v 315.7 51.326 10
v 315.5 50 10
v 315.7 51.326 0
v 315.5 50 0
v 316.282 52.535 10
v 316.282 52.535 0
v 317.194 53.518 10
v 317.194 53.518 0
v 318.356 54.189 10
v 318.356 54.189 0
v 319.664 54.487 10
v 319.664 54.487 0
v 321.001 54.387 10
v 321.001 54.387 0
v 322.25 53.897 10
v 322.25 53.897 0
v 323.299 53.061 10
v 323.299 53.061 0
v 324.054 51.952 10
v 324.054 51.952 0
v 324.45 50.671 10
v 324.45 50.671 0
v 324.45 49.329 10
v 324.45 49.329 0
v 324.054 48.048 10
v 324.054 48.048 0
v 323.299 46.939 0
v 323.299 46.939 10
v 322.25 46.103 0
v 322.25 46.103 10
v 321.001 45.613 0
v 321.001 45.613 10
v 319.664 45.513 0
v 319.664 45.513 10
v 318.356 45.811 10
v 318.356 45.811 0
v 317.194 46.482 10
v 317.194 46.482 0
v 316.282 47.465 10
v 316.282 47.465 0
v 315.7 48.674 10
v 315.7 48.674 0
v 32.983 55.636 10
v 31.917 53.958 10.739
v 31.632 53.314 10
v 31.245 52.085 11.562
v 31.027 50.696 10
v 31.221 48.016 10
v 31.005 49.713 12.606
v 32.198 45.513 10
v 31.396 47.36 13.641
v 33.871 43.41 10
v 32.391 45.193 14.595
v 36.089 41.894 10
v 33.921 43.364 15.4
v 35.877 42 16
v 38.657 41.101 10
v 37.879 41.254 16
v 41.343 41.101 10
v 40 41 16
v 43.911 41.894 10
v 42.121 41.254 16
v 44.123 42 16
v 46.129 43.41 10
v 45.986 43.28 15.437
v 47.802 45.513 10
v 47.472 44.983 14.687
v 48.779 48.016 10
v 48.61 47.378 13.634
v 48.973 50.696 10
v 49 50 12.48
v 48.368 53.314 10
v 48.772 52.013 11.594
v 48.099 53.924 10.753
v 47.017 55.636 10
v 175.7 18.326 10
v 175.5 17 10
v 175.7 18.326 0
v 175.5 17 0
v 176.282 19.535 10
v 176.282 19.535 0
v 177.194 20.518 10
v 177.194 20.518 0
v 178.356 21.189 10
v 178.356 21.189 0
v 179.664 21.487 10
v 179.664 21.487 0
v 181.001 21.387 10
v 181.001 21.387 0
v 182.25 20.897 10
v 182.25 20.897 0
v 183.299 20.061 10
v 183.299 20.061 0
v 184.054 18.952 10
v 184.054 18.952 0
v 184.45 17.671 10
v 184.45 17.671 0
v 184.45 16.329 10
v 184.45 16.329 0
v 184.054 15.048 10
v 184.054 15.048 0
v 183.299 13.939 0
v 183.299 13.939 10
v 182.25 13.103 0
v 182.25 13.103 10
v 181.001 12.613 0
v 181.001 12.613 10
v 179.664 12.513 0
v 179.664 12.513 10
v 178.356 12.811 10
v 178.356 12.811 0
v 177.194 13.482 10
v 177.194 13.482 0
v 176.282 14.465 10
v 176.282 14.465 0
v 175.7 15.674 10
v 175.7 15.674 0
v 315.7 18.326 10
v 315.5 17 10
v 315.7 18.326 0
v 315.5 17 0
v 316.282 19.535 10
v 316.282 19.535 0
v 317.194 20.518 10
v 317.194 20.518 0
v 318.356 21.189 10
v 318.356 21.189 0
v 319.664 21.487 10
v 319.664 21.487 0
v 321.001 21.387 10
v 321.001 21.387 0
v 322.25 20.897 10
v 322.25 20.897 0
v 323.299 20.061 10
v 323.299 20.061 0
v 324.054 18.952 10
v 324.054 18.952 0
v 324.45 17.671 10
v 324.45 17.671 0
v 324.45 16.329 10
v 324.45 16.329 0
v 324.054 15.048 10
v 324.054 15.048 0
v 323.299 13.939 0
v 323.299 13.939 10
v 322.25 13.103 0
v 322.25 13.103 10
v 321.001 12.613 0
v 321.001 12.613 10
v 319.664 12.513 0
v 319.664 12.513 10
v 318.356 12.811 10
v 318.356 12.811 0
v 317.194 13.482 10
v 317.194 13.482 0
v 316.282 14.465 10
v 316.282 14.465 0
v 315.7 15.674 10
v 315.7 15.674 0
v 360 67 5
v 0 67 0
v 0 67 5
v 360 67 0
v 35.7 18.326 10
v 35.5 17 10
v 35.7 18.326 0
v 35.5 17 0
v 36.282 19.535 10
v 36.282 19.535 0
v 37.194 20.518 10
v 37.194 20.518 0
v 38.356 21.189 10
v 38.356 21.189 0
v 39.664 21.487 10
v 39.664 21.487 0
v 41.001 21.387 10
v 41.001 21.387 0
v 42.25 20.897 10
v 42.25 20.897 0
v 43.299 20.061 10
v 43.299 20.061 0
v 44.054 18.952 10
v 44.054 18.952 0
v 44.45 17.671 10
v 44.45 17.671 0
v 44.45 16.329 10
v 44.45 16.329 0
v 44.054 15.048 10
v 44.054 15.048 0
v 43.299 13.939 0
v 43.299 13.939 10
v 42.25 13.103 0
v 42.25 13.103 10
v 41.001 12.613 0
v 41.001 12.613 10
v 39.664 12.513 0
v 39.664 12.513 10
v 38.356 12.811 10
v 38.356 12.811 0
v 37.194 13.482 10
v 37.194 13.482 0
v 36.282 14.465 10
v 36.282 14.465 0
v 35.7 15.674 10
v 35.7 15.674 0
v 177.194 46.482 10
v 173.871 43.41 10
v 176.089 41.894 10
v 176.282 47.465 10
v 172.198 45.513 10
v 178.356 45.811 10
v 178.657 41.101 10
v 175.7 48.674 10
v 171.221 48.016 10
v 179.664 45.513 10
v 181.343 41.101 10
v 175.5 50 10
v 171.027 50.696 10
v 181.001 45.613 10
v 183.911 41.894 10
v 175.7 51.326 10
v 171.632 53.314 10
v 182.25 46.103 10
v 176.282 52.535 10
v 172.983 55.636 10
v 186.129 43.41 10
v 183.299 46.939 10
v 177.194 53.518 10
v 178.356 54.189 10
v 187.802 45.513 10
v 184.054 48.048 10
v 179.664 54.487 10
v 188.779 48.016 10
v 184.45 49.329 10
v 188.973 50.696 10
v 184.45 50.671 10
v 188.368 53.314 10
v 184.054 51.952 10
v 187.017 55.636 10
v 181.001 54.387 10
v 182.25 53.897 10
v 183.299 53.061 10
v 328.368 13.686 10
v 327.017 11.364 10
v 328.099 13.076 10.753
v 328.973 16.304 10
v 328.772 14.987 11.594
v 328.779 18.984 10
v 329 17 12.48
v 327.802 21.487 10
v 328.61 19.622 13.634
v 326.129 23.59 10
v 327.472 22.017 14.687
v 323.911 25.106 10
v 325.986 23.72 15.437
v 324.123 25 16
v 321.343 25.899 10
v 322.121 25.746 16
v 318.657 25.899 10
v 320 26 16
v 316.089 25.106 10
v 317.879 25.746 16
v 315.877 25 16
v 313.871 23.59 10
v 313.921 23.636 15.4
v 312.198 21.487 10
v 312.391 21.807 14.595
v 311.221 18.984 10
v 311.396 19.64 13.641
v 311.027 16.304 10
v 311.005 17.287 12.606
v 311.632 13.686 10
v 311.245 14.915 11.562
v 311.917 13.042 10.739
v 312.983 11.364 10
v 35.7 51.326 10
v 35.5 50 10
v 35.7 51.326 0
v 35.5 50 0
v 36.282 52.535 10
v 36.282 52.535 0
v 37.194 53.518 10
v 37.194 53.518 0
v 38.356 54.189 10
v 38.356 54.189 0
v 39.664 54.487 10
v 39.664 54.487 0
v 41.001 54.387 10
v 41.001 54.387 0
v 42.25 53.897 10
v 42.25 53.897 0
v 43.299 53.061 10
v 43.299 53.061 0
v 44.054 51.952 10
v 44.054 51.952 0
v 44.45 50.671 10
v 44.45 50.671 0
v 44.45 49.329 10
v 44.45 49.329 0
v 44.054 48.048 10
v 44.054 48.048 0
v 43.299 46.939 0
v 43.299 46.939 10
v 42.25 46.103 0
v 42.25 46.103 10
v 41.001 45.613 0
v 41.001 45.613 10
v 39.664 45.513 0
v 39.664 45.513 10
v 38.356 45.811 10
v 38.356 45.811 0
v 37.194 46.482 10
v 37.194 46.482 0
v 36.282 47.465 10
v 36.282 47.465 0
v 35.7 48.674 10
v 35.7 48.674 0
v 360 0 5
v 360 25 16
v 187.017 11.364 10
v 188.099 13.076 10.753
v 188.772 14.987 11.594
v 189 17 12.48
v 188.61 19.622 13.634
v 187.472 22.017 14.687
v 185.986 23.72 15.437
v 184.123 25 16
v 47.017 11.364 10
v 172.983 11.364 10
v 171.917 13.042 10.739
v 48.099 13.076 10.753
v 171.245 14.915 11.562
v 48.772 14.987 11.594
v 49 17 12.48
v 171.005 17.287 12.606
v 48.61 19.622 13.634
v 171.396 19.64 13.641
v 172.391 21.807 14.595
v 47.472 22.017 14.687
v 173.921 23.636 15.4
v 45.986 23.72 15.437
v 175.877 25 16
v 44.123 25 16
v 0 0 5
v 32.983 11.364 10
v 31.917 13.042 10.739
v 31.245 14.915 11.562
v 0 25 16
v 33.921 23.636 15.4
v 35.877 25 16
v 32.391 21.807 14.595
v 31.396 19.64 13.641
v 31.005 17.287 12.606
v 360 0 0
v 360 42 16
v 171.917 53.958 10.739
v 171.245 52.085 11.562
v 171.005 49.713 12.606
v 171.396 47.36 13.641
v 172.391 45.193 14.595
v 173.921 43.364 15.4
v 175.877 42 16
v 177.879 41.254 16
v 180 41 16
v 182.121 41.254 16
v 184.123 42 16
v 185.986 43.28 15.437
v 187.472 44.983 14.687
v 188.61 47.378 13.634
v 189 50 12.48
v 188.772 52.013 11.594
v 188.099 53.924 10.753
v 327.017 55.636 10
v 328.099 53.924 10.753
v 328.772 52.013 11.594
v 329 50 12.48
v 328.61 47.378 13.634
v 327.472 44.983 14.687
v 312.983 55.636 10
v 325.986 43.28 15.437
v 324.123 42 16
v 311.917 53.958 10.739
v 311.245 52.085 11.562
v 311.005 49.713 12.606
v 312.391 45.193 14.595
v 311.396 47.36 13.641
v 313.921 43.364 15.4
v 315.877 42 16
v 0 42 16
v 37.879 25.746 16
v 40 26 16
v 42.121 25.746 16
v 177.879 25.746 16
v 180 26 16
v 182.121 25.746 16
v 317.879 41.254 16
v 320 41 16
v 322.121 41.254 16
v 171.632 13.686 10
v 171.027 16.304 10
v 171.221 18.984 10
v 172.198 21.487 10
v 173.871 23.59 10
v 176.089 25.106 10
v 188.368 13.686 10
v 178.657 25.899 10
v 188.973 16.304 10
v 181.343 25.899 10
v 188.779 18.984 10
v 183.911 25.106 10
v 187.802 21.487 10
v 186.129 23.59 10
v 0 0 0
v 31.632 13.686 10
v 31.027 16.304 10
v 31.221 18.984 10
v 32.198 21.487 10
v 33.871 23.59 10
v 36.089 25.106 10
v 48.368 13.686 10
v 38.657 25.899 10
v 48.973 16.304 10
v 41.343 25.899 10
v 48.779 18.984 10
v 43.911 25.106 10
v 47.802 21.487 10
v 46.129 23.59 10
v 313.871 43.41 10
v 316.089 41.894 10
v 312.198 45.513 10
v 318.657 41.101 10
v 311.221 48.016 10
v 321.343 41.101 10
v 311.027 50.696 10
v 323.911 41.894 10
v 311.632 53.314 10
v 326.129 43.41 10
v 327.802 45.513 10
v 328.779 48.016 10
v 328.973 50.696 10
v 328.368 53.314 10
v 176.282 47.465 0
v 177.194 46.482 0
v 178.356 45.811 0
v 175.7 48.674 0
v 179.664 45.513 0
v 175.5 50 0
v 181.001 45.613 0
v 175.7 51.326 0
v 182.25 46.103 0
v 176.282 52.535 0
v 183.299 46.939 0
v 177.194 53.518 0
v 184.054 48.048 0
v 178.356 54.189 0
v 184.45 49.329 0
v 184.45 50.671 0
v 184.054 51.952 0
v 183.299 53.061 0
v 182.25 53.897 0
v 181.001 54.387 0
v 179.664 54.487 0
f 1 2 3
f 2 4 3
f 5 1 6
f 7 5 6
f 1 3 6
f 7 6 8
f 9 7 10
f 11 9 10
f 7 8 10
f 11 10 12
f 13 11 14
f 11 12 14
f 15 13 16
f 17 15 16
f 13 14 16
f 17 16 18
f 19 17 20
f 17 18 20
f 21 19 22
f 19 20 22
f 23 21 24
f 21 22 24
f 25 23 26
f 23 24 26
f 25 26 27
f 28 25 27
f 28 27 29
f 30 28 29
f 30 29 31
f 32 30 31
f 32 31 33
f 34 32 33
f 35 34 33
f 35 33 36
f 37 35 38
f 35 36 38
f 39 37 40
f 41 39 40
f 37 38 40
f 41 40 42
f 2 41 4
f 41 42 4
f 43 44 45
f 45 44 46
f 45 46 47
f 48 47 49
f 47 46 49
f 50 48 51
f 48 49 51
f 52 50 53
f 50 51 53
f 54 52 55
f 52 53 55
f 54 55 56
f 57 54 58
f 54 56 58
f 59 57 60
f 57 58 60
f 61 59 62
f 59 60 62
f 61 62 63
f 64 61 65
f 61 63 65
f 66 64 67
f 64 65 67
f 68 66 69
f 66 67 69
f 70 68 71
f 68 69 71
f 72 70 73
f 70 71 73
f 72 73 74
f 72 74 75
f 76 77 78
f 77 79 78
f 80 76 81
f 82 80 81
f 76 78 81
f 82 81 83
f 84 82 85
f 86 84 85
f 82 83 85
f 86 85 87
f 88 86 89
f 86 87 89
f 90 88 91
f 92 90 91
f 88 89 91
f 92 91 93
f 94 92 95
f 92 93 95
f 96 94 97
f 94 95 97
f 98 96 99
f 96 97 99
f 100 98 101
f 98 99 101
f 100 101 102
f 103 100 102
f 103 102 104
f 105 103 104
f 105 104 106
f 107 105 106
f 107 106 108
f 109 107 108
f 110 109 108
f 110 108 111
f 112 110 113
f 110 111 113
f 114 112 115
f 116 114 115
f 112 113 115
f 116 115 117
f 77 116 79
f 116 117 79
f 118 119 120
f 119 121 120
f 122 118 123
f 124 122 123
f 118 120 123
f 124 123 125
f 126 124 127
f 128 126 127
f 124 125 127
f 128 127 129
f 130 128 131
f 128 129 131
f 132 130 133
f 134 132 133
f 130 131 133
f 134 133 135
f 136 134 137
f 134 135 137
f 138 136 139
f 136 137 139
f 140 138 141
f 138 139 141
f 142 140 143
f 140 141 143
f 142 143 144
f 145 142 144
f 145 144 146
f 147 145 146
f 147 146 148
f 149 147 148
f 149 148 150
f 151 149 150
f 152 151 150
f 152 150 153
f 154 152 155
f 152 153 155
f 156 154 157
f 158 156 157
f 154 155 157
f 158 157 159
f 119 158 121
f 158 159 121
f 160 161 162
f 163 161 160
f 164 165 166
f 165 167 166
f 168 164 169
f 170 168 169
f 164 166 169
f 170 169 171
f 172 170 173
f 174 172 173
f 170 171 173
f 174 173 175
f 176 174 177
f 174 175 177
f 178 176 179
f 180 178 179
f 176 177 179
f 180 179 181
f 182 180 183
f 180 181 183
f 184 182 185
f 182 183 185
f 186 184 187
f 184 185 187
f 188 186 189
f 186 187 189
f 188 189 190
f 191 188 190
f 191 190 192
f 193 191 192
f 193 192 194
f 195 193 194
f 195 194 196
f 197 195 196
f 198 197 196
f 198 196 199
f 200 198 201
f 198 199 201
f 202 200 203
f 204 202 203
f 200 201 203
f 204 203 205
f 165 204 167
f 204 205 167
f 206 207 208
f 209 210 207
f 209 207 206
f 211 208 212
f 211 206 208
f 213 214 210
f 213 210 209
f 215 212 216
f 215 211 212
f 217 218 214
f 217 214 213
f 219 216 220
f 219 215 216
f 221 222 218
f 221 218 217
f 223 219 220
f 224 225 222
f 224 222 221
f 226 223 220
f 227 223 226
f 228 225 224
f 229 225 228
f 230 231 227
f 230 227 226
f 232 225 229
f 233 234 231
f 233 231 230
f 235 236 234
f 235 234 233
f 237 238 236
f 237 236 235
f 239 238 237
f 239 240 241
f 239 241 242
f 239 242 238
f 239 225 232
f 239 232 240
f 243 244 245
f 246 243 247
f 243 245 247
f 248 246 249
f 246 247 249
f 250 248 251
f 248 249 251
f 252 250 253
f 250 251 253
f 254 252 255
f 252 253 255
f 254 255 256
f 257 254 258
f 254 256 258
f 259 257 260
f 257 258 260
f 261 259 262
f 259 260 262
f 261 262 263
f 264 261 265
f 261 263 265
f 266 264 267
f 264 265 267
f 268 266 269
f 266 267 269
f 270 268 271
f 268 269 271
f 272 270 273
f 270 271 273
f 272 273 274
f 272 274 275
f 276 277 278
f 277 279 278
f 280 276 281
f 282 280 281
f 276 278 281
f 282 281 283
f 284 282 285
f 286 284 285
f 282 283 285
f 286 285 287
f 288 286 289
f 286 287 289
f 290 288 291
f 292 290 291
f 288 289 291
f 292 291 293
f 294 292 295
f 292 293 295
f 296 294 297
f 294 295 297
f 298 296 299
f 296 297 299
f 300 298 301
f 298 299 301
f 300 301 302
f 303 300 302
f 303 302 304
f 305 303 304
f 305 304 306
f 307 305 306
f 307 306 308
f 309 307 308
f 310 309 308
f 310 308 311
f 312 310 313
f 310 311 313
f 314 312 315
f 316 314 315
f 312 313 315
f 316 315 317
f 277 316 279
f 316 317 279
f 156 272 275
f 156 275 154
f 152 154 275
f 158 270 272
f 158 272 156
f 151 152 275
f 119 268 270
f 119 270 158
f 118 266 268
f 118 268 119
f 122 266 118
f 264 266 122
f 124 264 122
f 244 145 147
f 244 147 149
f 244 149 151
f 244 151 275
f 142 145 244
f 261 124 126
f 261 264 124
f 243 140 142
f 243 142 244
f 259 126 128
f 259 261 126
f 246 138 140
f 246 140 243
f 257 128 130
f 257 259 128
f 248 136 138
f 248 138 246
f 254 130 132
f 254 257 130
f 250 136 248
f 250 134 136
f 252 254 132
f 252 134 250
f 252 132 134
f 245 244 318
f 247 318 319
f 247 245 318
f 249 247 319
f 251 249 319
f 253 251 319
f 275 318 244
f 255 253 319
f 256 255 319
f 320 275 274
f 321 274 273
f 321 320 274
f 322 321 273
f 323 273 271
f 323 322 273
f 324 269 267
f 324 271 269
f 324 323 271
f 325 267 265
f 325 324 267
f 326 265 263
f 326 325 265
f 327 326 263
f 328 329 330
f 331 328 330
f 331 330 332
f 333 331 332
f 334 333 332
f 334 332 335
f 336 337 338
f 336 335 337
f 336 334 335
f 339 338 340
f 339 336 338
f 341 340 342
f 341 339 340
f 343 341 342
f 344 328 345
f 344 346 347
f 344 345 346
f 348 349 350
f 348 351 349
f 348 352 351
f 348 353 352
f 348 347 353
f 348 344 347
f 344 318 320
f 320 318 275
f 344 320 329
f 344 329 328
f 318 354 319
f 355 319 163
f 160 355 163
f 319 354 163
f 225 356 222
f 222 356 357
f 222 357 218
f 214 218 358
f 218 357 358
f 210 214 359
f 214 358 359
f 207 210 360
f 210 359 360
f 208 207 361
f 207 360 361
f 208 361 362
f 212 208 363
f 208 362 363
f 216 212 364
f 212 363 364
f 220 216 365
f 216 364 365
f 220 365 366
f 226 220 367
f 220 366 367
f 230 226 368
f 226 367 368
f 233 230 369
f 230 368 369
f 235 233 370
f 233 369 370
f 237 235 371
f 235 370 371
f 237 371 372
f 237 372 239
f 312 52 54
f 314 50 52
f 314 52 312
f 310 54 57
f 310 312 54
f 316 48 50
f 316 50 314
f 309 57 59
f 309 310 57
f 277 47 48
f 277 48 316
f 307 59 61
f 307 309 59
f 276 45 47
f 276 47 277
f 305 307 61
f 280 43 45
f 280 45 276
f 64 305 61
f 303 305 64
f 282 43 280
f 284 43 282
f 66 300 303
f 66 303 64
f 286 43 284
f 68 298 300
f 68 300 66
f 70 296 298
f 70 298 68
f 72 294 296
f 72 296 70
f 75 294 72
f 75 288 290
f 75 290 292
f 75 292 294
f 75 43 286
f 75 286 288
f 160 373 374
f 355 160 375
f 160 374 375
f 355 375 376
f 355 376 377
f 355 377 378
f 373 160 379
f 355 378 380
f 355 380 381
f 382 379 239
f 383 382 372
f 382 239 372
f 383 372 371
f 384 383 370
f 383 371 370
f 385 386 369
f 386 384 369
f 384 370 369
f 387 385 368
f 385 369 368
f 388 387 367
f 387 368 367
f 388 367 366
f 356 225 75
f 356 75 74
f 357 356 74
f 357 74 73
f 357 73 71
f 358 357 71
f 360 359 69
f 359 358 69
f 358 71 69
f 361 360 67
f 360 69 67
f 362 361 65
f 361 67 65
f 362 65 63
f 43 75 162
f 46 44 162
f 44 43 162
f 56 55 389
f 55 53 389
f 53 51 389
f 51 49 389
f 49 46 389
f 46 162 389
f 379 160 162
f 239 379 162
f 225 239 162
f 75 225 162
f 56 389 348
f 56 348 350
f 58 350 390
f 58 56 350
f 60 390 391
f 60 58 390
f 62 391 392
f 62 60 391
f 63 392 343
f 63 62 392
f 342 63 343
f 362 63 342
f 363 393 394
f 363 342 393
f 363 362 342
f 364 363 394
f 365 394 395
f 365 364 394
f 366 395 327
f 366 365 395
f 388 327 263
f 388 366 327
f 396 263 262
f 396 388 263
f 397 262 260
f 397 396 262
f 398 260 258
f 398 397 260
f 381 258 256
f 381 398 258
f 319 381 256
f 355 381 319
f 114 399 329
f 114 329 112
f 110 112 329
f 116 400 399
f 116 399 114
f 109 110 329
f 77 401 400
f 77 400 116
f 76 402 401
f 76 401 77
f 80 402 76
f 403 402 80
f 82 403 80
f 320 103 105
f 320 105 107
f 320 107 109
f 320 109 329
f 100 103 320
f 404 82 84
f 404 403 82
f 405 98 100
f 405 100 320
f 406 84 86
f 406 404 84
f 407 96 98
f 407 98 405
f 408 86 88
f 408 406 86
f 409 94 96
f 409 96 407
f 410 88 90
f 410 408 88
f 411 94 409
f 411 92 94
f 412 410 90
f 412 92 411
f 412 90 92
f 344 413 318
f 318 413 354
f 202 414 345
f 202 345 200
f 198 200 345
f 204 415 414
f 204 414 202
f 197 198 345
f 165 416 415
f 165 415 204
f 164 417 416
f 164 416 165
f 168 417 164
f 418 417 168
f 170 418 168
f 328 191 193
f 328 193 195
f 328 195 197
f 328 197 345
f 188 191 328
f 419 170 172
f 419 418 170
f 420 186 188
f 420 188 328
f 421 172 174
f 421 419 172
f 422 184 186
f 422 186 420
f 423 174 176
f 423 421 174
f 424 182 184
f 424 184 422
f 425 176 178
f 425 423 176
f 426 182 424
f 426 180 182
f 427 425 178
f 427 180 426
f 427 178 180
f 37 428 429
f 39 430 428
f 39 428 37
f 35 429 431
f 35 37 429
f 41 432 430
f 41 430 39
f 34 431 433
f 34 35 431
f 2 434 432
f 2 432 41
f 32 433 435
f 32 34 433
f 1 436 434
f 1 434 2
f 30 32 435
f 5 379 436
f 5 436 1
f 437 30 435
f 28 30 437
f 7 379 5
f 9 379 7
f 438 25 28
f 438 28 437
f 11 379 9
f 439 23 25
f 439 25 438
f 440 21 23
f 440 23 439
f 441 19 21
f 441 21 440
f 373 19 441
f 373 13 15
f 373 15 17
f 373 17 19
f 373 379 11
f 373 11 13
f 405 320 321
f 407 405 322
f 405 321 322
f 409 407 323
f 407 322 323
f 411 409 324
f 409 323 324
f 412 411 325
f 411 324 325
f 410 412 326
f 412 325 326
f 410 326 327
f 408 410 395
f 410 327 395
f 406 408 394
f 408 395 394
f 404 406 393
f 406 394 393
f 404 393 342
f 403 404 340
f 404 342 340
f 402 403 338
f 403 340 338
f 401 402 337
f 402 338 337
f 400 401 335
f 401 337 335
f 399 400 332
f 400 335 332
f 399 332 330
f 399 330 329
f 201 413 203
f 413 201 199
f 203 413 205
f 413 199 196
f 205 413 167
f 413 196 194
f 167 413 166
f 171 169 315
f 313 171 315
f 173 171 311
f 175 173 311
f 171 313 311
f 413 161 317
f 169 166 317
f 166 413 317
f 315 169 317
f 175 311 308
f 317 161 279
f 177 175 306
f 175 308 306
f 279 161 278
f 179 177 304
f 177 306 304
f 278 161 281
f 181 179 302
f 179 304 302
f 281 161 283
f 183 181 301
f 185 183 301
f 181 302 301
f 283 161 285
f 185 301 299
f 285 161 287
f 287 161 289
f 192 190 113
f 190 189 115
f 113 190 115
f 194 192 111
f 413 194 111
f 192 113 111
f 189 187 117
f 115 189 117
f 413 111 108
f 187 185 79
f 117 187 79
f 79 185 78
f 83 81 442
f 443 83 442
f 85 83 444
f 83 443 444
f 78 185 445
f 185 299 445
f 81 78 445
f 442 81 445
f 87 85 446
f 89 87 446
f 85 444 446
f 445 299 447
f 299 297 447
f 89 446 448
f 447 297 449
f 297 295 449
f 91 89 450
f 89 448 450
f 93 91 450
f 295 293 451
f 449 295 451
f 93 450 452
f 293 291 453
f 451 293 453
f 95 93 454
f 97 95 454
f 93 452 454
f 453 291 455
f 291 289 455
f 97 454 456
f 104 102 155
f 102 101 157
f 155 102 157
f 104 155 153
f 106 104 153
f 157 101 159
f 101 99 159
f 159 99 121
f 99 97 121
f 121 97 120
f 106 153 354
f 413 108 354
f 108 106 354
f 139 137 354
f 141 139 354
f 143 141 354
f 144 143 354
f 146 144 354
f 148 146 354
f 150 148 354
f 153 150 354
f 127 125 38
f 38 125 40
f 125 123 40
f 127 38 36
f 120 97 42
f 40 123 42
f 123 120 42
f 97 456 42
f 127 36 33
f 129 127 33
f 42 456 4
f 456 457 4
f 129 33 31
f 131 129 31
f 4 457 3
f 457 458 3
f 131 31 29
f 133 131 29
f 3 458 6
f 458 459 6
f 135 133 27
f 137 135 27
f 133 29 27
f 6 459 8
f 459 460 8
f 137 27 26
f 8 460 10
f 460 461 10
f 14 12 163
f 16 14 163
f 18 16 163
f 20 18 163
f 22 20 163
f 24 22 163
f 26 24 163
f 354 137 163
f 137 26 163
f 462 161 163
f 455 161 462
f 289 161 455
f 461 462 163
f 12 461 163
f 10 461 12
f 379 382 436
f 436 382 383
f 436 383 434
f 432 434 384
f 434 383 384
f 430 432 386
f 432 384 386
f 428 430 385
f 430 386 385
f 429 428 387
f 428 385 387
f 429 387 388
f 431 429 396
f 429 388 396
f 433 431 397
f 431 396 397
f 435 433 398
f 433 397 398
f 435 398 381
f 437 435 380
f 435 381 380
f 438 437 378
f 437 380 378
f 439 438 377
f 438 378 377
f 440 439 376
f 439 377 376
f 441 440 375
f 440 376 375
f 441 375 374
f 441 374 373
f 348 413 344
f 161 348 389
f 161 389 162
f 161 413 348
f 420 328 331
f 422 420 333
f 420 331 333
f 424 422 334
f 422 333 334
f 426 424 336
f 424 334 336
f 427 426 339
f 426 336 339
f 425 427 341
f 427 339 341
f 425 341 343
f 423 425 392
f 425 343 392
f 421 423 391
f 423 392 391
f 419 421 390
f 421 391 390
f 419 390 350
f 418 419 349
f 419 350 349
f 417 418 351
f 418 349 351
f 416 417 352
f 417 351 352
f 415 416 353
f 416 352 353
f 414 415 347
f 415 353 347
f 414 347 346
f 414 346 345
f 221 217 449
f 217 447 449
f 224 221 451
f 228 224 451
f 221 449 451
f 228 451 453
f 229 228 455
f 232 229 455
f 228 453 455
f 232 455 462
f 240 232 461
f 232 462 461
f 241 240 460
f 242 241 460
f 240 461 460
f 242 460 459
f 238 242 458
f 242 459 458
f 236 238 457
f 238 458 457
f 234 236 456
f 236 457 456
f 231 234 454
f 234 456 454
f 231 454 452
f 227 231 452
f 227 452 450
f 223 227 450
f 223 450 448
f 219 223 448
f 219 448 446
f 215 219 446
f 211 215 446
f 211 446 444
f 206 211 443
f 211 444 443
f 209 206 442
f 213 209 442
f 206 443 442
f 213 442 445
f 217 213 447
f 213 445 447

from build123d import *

# Parameters (mm, degrees)
ESBO_O1_W                                           = 360
ESBO_O1_H                                           = 67
RESSALTO_EXTRUS_O1_DEPTH                            = 16
CORTE_EXTRUS_O1_DEPTH                               = 367.531035521
REBAIXO_PARA_PARAFUSO_COM_CABE_A_PANELA_D           = 9
REBAIXO_PARA_PARAFUSO_COM_CABE_A_PANELA_CBORE_D     = 18
REBAIXO_PARA_PARAFUSO_COM_CABE_A_PANELA_CBORE_DEPTH = 6


with BuildPart() as part:
    # Esboço1 → Ressalto-extrusão1 (new body)
    with BuildSketch(Plane.XY):
        with Locations((180, 33.5)):
            Rectangle(ESBO_O1_W, ESBO_O1_H)
    extrude(amount=RESSALTO_EXTRUS_O1_DEPTH)

    # Esboço2 → Corte-extrusão1 (cut, through all)
    with BuildSketch(Plane.ZY):
        Polygon((5, 0), (16, 25), (16, 0), align=None)
        Polygon((5, 67), (16, 42), (16, 67), align=None)
    extrude(amount=-CORTE_EXTRUS_O1_DEPTH, mode=Mode.SUBTRACT)

    # Rebaixo para parafuso com cabeça panela de M81 (through all)
    with Locations(Plane.XY.offset(16)):
        with Locations((40, 50), (40, 17), (180, 50), (180, 17), (320, 50), (320, 17)):
            CounterBoreHole(REBAIXO_PARA_PARAFUSO_COM_CABE_A_PANELA_D / 2, REBAIXO_PARA_PARAFUSO_COM_CABE_A_PANELA_CBORE_D / 2, REBAIXO_PARA_PARAFUSO_COM_CABE_A_PANELA_CBORE_DEPTH)


solid = part.part
